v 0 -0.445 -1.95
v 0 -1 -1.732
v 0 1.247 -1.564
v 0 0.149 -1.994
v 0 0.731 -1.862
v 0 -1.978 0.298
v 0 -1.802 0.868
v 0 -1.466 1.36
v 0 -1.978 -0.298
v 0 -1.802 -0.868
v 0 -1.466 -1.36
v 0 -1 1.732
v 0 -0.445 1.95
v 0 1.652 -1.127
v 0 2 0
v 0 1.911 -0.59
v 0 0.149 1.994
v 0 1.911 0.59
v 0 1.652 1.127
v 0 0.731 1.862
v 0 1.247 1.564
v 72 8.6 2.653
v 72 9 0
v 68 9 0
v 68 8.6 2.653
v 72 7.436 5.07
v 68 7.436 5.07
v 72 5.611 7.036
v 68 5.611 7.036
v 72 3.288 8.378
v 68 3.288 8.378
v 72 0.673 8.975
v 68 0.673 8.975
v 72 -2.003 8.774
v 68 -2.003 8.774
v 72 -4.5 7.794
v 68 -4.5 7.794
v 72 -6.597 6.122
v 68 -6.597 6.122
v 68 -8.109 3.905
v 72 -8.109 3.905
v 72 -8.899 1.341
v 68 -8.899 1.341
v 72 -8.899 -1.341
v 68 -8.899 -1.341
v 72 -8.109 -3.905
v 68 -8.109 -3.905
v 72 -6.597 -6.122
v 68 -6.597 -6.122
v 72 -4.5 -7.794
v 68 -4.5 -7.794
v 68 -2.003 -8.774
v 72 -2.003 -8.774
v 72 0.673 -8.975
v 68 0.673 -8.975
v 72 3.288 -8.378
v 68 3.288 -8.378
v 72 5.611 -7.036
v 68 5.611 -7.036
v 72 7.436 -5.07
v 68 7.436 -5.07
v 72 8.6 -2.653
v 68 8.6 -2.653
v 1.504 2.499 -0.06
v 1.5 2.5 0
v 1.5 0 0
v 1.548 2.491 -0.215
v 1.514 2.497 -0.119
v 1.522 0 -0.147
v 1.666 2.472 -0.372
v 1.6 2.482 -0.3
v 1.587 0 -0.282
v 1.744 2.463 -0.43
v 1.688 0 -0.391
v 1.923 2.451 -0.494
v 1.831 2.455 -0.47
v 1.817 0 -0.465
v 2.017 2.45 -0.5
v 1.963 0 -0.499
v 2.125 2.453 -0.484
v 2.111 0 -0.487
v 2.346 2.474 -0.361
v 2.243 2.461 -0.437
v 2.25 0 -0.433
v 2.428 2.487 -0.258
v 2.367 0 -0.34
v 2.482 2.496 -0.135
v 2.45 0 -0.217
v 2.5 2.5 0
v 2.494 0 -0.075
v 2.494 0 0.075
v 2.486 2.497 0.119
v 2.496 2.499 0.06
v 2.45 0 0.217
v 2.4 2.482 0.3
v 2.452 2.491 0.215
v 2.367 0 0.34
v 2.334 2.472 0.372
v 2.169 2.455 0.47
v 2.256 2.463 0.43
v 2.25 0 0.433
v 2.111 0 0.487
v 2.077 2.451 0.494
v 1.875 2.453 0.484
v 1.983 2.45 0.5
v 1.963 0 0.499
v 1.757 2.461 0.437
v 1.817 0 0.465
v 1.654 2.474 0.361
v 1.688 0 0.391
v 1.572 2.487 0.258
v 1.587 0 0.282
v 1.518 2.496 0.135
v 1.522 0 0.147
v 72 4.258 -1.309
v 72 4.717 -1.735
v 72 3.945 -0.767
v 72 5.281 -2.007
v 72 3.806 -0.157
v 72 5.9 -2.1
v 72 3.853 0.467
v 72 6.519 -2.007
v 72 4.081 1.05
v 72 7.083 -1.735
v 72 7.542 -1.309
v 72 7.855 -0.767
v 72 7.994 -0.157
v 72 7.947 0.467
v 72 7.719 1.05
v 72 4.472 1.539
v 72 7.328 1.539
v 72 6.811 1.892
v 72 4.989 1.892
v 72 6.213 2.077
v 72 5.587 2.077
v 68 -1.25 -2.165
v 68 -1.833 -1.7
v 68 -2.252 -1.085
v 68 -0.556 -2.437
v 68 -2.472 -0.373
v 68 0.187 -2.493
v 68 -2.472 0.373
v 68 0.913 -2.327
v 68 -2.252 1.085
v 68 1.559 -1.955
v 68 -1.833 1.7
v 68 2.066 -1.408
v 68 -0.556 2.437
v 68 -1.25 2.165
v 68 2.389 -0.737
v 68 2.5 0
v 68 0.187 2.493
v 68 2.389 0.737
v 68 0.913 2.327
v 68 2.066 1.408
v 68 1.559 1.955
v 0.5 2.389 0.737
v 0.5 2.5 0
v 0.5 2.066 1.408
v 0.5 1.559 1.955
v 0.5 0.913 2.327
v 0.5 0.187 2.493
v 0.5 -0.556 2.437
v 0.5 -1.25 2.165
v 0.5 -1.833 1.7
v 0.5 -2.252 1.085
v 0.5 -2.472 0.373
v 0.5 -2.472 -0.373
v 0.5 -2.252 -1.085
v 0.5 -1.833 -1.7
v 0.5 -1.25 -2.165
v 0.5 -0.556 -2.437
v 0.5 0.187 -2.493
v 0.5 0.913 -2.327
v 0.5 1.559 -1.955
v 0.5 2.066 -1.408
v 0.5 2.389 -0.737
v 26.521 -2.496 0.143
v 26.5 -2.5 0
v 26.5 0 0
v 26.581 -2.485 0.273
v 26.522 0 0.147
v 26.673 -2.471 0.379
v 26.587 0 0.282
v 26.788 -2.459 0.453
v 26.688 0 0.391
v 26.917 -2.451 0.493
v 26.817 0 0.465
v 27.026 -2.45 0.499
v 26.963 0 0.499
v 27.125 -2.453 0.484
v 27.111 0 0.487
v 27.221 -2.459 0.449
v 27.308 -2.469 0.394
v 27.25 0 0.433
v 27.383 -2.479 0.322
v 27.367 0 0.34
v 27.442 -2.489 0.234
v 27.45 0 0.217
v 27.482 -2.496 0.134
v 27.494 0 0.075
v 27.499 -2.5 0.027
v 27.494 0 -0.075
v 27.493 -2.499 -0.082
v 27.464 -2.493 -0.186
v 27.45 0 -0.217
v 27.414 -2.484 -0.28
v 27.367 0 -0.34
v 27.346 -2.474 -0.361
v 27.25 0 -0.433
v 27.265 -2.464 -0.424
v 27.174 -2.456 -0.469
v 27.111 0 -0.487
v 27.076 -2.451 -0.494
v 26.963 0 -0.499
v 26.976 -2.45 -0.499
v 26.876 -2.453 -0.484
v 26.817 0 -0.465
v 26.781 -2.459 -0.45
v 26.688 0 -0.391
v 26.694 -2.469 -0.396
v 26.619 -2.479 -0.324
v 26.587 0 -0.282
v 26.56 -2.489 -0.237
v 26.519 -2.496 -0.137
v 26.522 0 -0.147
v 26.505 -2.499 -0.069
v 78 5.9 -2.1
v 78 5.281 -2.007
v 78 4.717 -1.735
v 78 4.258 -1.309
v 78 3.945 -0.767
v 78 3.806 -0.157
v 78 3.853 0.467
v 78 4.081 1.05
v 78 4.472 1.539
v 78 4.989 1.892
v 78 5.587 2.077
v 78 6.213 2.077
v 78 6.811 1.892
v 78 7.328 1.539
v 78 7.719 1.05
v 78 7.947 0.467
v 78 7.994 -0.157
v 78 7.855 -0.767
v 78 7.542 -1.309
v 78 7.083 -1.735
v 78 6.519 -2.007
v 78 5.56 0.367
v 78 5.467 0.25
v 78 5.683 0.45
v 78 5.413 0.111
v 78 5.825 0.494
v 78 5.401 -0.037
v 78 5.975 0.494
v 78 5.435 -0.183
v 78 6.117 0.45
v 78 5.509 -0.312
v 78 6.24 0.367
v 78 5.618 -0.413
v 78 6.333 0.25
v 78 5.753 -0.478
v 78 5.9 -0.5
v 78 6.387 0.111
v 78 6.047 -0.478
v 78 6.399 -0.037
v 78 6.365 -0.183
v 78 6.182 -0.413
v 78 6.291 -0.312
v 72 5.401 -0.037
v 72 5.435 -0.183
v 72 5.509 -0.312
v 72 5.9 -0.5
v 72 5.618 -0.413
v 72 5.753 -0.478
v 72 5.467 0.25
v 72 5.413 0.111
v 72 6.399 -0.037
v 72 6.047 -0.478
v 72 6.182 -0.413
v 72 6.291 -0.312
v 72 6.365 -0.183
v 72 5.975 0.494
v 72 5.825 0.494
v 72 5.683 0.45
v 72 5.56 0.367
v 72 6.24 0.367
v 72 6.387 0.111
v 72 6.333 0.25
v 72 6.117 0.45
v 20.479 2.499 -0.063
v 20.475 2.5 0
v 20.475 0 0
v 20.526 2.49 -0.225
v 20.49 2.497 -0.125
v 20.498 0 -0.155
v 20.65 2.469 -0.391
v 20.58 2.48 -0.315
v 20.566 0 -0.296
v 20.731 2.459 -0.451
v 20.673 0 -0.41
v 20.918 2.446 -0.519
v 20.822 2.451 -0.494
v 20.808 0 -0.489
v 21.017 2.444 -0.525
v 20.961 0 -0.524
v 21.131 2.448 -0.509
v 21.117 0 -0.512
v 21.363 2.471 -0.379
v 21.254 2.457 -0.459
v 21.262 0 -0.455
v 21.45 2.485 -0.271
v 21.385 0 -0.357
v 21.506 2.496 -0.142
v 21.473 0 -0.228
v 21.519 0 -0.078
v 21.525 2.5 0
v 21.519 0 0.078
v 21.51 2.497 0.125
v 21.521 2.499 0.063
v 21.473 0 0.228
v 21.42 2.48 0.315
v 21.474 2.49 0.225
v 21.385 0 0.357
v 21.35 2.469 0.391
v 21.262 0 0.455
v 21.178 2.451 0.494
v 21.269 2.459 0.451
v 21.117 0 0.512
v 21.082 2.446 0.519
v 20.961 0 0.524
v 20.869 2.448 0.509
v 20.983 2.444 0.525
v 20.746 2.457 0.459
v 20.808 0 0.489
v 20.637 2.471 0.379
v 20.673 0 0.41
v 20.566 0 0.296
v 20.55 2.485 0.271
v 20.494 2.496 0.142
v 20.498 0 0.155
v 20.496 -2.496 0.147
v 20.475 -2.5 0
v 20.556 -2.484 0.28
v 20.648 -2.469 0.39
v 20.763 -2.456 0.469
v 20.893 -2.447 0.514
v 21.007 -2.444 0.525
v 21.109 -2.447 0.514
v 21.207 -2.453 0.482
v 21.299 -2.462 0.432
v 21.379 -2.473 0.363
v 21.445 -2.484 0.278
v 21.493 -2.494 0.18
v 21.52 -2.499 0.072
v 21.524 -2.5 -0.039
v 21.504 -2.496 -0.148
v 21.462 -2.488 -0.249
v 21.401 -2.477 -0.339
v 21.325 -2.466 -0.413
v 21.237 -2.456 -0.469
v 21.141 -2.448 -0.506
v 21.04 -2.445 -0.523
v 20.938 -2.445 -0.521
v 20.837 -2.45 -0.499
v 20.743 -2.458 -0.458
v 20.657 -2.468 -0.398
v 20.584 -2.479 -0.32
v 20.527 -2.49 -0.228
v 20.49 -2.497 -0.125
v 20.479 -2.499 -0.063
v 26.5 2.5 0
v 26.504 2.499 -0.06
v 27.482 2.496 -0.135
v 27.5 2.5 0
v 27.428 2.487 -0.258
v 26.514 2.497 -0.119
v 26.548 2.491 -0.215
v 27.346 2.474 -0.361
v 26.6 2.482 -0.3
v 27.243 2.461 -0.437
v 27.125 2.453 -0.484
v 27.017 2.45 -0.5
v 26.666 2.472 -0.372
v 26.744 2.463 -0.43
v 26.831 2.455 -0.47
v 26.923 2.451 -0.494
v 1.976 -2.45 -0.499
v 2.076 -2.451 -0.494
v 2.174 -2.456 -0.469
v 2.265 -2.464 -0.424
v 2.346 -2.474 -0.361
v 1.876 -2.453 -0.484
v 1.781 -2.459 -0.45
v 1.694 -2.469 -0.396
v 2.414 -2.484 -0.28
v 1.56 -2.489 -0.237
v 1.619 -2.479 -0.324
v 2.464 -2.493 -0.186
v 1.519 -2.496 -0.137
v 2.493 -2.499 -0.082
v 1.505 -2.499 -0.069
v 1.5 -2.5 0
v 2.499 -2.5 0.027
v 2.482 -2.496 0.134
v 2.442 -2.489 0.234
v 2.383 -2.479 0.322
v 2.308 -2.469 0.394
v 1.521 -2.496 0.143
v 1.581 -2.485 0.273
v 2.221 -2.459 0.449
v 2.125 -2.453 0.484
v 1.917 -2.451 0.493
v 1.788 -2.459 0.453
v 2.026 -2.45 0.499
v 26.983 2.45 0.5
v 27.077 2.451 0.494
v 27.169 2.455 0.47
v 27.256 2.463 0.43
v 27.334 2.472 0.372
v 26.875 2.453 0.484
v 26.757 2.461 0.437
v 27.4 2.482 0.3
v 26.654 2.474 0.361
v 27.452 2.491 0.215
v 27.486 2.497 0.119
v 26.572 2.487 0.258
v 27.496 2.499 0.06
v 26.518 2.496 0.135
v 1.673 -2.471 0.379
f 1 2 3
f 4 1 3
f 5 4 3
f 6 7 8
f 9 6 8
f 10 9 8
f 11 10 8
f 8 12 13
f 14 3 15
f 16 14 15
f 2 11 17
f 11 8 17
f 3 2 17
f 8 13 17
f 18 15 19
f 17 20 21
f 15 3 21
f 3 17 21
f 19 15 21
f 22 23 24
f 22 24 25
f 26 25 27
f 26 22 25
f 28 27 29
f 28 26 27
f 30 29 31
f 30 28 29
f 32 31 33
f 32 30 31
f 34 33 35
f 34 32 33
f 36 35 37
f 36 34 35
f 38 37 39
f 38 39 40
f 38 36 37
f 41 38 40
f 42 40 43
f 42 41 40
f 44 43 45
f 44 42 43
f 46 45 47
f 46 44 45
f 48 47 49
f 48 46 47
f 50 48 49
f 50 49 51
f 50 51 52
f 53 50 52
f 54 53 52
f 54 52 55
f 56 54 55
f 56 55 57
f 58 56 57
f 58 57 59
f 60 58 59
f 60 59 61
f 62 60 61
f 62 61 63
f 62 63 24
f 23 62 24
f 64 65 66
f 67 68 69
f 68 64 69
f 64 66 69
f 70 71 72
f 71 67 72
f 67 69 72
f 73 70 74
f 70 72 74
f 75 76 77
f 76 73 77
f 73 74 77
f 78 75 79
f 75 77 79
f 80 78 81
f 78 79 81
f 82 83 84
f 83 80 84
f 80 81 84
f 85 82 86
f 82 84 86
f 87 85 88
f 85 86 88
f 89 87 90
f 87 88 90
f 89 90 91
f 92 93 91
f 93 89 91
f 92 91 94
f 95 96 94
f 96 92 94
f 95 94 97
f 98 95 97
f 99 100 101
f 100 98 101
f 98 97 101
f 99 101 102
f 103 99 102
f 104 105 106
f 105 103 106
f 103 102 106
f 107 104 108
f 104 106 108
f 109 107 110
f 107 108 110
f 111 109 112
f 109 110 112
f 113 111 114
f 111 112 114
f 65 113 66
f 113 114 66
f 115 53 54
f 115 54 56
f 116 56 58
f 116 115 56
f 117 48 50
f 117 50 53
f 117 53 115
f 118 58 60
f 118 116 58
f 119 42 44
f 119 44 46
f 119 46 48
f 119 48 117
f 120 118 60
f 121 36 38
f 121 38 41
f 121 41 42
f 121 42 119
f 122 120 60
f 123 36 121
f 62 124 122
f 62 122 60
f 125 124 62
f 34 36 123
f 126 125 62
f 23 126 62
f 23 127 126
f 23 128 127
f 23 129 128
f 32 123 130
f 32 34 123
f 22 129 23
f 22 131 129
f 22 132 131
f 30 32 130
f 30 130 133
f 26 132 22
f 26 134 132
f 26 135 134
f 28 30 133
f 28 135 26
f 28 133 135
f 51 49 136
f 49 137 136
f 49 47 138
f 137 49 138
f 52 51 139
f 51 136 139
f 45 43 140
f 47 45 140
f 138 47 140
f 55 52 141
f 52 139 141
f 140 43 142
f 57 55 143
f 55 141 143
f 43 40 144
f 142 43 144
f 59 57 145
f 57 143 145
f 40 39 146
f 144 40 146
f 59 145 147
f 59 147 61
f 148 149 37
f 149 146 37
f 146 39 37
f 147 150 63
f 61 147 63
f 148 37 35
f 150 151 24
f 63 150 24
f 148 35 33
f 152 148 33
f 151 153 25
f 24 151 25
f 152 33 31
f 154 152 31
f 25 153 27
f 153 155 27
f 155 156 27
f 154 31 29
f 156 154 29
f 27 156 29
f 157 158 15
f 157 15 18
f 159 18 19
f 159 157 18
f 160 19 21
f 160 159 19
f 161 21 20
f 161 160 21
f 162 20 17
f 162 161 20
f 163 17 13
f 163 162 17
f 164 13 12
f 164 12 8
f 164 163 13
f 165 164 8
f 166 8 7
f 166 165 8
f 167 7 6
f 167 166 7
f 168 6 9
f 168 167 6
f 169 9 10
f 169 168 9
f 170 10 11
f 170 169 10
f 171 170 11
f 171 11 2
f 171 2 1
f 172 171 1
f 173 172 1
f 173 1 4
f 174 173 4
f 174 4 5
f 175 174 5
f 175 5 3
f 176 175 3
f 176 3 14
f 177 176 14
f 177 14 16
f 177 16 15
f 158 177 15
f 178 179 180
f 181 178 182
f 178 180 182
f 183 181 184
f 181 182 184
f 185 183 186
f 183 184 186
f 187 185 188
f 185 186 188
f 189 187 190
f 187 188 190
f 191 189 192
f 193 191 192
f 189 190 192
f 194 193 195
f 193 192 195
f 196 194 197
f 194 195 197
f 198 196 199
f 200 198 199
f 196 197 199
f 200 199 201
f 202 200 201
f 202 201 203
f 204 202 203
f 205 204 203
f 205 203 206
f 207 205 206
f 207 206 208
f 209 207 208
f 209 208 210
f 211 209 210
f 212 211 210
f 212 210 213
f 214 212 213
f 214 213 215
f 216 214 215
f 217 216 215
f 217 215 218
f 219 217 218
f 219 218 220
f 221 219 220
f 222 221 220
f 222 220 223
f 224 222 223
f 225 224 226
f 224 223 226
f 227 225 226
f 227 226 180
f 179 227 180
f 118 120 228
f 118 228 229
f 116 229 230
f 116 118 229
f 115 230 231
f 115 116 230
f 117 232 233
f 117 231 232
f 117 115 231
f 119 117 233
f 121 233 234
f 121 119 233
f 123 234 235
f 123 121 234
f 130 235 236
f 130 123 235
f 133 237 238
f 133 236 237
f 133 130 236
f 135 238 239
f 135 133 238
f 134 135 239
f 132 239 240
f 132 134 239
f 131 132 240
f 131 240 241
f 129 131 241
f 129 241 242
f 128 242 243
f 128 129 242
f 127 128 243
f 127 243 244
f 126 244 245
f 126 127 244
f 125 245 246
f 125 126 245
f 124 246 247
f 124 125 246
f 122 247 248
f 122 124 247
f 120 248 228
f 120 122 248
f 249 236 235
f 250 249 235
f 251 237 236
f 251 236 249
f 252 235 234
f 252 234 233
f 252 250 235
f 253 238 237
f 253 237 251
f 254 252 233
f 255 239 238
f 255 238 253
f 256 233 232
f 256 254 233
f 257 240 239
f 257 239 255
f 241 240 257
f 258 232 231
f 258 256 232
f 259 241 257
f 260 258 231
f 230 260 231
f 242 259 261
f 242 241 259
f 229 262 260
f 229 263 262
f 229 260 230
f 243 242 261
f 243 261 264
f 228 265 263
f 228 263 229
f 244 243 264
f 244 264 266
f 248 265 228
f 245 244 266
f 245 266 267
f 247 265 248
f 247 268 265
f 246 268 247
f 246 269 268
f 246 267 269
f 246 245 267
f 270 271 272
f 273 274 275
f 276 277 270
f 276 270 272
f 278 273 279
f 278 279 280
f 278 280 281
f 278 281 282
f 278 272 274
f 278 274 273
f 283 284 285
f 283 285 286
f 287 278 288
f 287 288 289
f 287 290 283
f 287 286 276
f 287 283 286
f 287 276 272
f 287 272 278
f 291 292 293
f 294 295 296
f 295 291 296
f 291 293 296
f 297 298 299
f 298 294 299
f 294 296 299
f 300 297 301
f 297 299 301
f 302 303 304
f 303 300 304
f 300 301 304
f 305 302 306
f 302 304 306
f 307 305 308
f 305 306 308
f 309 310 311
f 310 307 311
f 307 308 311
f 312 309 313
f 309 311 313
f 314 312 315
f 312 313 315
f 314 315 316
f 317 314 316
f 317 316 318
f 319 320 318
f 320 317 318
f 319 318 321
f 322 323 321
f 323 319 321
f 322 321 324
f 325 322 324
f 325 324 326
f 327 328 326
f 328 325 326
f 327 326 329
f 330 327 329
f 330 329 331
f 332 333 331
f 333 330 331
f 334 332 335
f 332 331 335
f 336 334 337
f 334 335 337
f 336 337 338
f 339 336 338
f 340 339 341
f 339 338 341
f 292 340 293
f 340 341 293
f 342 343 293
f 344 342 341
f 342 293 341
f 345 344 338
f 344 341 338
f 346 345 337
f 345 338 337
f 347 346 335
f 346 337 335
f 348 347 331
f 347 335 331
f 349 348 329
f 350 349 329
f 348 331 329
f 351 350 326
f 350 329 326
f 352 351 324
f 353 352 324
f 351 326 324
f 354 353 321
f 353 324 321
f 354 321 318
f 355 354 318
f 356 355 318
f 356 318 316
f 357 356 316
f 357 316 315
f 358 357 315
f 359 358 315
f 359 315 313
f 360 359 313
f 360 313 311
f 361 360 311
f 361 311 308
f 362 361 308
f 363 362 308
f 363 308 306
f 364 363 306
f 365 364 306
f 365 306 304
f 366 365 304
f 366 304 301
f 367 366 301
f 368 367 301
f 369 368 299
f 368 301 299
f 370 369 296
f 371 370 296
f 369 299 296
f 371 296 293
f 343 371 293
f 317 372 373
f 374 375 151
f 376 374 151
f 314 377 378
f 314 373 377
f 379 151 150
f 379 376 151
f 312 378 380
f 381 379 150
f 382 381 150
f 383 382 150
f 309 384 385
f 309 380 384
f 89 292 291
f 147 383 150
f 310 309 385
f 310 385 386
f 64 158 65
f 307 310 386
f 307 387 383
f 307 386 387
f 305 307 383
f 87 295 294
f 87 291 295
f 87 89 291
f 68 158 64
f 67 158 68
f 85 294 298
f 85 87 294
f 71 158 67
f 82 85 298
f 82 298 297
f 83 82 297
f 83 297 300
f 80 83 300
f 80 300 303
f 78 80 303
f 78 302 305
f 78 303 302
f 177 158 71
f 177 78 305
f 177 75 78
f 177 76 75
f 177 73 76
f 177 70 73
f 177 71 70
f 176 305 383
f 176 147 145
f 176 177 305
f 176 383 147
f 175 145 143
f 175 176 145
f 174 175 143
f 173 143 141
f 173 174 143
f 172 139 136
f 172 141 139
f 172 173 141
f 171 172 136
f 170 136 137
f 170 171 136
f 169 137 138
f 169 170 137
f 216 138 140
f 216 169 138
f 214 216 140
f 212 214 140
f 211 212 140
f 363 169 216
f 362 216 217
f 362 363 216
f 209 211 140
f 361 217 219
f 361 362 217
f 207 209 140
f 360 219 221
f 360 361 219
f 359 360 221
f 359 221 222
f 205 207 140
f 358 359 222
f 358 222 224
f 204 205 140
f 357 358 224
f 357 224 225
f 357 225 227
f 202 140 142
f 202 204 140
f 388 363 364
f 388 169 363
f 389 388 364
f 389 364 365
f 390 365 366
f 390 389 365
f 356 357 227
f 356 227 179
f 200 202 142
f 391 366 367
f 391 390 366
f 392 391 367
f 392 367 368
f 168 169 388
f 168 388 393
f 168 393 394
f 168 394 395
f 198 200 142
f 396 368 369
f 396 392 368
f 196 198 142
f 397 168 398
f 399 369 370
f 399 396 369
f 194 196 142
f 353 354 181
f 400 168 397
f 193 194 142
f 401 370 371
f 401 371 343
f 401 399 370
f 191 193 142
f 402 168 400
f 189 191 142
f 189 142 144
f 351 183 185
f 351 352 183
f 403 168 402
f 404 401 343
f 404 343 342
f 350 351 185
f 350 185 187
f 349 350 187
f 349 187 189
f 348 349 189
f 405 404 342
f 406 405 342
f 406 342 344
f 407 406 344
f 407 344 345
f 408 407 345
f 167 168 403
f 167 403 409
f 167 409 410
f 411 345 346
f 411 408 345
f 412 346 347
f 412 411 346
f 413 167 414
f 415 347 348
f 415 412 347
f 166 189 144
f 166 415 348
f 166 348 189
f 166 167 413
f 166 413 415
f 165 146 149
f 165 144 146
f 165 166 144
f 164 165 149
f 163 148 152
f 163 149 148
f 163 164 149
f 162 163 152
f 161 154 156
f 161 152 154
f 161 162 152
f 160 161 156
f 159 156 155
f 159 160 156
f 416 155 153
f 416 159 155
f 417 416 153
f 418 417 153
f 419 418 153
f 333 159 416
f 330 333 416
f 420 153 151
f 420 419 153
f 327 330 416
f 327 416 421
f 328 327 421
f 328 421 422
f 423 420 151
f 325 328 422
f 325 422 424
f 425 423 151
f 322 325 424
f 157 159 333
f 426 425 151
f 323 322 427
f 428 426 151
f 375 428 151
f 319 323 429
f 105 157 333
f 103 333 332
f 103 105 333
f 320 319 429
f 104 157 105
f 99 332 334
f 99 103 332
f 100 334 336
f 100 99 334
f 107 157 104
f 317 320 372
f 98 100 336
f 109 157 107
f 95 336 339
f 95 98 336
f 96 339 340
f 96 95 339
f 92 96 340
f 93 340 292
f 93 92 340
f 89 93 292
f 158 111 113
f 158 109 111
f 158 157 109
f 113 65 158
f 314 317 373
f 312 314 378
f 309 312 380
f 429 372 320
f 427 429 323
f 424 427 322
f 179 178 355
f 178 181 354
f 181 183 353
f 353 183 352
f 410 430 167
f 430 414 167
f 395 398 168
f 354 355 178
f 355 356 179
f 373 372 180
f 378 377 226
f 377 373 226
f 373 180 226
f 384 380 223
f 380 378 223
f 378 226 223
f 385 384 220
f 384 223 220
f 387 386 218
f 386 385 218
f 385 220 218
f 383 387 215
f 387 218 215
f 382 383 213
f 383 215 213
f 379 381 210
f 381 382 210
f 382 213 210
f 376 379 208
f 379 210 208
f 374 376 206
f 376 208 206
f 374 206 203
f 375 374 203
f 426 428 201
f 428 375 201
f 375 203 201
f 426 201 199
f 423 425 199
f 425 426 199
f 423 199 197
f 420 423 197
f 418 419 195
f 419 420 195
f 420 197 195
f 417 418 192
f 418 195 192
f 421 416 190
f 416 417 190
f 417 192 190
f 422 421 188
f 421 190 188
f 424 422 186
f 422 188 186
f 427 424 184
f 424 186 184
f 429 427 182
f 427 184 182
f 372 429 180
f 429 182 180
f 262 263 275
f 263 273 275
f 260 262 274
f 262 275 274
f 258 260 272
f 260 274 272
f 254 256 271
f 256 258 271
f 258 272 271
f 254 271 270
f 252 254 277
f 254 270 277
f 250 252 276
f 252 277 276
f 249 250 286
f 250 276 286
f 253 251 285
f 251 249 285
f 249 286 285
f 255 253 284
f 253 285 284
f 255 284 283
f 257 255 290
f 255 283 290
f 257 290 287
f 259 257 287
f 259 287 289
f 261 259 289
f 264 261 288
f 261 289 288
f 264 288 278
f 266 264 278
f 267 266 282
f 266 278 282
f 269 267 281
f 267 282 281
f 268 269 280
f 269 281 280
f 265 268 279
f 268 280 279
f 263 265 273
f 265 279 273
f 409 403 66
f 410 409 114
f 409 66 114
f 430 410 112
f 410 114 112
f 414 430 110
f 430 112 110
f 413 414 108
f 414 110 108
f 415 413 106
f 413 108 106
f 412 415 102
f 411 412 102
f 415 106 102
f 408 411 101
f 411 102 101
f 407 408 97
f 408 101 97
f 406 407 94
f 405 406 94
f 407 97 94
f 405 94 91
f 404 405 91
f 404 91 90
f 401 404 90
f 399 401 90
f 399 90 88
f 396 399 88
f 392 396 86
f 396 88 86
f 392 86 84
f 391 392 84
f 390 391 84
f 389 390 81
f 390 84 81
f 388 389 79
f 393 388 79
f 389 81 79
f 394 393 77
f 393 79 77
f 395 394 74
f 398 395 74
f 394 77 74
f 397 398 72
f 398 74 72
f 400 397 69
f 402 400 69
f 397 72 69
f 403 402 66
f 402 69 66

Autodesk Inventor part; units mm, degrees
ref_plane "YZ Plane" through (0, 0, 0) normal (1, 0, 0) x (0, 1, 0)
ref_plane "XZ Plane" through (0, 0, 0) normal (0, 1, 0) x (-1, 0, 0)
ref_plane "XY Plane" through (0, 0, 0) normal (0, 0, 1) x (1, 0, 0)
sketch "Sketch1" plane through (0, 0, 0) normal (0, 0, 1) x (1, 0, 0)
  line L0 (0, 0) -> (72, 0)
  line L1 (68, 2.5) -> (0, 2.5)
  line L2 (0, 2.5) -> (0, 0)
  line L3 (68, 2.5) -> (68, 9)
  line L4 (68, 9) -> (72, 9)
  line L5 (72, 9) -> (72, 0)
revolve "Revolution1" add sketch "Sketch1" angle 360 about axis through (0, 0, 0) along (1, 0, 0)
chamfer "Chamfer1" distance 0.5 angle 45 1 edges at (0, -2.5, 0)
thread "Thread1" size "M5x0.8" class "6g" standard "ISO Metric profile" length 10 offset 58
sketch "Sketch2" plane through (72, 0, 0) normal (1, 0, 0) x (0, 0, -1)
  circle A0 centre (0, 5.9) radius 2.1
  circle A1 centre (0, 5.9) radius 0.5
extrude "Extrusion1" add sketch "Sketch2" along normal blind 6
sketch "Sketch3" plane through (0, 0, 0) normal (0, 1, 0) x (-1, 0, 0)
  circle A0 centre (-2, 0) radius 0.5
extrude "Extrusion2" cut sketch "Sketch3" along normal mid plane 10
sketch "Sketch4" plane through (0, 0, 0) normal (0, 1, 0) x (-1, 0, 0)
  circle A0 centre (-27, 0) radius 0.5
extrude "Extrusion3" cut sketch "Sketch4" along normal mid plane 10
sketch "Sketch5" plane through (0, 0, 0) normal (0, 1, 0) x (-1, 0, 0)
  circle A0 centre (-21, 0) radius 0.525
extrude "Extrusion4" cut sketch "Sketch5" along normal mid plane 10
properties part number "shaft"
